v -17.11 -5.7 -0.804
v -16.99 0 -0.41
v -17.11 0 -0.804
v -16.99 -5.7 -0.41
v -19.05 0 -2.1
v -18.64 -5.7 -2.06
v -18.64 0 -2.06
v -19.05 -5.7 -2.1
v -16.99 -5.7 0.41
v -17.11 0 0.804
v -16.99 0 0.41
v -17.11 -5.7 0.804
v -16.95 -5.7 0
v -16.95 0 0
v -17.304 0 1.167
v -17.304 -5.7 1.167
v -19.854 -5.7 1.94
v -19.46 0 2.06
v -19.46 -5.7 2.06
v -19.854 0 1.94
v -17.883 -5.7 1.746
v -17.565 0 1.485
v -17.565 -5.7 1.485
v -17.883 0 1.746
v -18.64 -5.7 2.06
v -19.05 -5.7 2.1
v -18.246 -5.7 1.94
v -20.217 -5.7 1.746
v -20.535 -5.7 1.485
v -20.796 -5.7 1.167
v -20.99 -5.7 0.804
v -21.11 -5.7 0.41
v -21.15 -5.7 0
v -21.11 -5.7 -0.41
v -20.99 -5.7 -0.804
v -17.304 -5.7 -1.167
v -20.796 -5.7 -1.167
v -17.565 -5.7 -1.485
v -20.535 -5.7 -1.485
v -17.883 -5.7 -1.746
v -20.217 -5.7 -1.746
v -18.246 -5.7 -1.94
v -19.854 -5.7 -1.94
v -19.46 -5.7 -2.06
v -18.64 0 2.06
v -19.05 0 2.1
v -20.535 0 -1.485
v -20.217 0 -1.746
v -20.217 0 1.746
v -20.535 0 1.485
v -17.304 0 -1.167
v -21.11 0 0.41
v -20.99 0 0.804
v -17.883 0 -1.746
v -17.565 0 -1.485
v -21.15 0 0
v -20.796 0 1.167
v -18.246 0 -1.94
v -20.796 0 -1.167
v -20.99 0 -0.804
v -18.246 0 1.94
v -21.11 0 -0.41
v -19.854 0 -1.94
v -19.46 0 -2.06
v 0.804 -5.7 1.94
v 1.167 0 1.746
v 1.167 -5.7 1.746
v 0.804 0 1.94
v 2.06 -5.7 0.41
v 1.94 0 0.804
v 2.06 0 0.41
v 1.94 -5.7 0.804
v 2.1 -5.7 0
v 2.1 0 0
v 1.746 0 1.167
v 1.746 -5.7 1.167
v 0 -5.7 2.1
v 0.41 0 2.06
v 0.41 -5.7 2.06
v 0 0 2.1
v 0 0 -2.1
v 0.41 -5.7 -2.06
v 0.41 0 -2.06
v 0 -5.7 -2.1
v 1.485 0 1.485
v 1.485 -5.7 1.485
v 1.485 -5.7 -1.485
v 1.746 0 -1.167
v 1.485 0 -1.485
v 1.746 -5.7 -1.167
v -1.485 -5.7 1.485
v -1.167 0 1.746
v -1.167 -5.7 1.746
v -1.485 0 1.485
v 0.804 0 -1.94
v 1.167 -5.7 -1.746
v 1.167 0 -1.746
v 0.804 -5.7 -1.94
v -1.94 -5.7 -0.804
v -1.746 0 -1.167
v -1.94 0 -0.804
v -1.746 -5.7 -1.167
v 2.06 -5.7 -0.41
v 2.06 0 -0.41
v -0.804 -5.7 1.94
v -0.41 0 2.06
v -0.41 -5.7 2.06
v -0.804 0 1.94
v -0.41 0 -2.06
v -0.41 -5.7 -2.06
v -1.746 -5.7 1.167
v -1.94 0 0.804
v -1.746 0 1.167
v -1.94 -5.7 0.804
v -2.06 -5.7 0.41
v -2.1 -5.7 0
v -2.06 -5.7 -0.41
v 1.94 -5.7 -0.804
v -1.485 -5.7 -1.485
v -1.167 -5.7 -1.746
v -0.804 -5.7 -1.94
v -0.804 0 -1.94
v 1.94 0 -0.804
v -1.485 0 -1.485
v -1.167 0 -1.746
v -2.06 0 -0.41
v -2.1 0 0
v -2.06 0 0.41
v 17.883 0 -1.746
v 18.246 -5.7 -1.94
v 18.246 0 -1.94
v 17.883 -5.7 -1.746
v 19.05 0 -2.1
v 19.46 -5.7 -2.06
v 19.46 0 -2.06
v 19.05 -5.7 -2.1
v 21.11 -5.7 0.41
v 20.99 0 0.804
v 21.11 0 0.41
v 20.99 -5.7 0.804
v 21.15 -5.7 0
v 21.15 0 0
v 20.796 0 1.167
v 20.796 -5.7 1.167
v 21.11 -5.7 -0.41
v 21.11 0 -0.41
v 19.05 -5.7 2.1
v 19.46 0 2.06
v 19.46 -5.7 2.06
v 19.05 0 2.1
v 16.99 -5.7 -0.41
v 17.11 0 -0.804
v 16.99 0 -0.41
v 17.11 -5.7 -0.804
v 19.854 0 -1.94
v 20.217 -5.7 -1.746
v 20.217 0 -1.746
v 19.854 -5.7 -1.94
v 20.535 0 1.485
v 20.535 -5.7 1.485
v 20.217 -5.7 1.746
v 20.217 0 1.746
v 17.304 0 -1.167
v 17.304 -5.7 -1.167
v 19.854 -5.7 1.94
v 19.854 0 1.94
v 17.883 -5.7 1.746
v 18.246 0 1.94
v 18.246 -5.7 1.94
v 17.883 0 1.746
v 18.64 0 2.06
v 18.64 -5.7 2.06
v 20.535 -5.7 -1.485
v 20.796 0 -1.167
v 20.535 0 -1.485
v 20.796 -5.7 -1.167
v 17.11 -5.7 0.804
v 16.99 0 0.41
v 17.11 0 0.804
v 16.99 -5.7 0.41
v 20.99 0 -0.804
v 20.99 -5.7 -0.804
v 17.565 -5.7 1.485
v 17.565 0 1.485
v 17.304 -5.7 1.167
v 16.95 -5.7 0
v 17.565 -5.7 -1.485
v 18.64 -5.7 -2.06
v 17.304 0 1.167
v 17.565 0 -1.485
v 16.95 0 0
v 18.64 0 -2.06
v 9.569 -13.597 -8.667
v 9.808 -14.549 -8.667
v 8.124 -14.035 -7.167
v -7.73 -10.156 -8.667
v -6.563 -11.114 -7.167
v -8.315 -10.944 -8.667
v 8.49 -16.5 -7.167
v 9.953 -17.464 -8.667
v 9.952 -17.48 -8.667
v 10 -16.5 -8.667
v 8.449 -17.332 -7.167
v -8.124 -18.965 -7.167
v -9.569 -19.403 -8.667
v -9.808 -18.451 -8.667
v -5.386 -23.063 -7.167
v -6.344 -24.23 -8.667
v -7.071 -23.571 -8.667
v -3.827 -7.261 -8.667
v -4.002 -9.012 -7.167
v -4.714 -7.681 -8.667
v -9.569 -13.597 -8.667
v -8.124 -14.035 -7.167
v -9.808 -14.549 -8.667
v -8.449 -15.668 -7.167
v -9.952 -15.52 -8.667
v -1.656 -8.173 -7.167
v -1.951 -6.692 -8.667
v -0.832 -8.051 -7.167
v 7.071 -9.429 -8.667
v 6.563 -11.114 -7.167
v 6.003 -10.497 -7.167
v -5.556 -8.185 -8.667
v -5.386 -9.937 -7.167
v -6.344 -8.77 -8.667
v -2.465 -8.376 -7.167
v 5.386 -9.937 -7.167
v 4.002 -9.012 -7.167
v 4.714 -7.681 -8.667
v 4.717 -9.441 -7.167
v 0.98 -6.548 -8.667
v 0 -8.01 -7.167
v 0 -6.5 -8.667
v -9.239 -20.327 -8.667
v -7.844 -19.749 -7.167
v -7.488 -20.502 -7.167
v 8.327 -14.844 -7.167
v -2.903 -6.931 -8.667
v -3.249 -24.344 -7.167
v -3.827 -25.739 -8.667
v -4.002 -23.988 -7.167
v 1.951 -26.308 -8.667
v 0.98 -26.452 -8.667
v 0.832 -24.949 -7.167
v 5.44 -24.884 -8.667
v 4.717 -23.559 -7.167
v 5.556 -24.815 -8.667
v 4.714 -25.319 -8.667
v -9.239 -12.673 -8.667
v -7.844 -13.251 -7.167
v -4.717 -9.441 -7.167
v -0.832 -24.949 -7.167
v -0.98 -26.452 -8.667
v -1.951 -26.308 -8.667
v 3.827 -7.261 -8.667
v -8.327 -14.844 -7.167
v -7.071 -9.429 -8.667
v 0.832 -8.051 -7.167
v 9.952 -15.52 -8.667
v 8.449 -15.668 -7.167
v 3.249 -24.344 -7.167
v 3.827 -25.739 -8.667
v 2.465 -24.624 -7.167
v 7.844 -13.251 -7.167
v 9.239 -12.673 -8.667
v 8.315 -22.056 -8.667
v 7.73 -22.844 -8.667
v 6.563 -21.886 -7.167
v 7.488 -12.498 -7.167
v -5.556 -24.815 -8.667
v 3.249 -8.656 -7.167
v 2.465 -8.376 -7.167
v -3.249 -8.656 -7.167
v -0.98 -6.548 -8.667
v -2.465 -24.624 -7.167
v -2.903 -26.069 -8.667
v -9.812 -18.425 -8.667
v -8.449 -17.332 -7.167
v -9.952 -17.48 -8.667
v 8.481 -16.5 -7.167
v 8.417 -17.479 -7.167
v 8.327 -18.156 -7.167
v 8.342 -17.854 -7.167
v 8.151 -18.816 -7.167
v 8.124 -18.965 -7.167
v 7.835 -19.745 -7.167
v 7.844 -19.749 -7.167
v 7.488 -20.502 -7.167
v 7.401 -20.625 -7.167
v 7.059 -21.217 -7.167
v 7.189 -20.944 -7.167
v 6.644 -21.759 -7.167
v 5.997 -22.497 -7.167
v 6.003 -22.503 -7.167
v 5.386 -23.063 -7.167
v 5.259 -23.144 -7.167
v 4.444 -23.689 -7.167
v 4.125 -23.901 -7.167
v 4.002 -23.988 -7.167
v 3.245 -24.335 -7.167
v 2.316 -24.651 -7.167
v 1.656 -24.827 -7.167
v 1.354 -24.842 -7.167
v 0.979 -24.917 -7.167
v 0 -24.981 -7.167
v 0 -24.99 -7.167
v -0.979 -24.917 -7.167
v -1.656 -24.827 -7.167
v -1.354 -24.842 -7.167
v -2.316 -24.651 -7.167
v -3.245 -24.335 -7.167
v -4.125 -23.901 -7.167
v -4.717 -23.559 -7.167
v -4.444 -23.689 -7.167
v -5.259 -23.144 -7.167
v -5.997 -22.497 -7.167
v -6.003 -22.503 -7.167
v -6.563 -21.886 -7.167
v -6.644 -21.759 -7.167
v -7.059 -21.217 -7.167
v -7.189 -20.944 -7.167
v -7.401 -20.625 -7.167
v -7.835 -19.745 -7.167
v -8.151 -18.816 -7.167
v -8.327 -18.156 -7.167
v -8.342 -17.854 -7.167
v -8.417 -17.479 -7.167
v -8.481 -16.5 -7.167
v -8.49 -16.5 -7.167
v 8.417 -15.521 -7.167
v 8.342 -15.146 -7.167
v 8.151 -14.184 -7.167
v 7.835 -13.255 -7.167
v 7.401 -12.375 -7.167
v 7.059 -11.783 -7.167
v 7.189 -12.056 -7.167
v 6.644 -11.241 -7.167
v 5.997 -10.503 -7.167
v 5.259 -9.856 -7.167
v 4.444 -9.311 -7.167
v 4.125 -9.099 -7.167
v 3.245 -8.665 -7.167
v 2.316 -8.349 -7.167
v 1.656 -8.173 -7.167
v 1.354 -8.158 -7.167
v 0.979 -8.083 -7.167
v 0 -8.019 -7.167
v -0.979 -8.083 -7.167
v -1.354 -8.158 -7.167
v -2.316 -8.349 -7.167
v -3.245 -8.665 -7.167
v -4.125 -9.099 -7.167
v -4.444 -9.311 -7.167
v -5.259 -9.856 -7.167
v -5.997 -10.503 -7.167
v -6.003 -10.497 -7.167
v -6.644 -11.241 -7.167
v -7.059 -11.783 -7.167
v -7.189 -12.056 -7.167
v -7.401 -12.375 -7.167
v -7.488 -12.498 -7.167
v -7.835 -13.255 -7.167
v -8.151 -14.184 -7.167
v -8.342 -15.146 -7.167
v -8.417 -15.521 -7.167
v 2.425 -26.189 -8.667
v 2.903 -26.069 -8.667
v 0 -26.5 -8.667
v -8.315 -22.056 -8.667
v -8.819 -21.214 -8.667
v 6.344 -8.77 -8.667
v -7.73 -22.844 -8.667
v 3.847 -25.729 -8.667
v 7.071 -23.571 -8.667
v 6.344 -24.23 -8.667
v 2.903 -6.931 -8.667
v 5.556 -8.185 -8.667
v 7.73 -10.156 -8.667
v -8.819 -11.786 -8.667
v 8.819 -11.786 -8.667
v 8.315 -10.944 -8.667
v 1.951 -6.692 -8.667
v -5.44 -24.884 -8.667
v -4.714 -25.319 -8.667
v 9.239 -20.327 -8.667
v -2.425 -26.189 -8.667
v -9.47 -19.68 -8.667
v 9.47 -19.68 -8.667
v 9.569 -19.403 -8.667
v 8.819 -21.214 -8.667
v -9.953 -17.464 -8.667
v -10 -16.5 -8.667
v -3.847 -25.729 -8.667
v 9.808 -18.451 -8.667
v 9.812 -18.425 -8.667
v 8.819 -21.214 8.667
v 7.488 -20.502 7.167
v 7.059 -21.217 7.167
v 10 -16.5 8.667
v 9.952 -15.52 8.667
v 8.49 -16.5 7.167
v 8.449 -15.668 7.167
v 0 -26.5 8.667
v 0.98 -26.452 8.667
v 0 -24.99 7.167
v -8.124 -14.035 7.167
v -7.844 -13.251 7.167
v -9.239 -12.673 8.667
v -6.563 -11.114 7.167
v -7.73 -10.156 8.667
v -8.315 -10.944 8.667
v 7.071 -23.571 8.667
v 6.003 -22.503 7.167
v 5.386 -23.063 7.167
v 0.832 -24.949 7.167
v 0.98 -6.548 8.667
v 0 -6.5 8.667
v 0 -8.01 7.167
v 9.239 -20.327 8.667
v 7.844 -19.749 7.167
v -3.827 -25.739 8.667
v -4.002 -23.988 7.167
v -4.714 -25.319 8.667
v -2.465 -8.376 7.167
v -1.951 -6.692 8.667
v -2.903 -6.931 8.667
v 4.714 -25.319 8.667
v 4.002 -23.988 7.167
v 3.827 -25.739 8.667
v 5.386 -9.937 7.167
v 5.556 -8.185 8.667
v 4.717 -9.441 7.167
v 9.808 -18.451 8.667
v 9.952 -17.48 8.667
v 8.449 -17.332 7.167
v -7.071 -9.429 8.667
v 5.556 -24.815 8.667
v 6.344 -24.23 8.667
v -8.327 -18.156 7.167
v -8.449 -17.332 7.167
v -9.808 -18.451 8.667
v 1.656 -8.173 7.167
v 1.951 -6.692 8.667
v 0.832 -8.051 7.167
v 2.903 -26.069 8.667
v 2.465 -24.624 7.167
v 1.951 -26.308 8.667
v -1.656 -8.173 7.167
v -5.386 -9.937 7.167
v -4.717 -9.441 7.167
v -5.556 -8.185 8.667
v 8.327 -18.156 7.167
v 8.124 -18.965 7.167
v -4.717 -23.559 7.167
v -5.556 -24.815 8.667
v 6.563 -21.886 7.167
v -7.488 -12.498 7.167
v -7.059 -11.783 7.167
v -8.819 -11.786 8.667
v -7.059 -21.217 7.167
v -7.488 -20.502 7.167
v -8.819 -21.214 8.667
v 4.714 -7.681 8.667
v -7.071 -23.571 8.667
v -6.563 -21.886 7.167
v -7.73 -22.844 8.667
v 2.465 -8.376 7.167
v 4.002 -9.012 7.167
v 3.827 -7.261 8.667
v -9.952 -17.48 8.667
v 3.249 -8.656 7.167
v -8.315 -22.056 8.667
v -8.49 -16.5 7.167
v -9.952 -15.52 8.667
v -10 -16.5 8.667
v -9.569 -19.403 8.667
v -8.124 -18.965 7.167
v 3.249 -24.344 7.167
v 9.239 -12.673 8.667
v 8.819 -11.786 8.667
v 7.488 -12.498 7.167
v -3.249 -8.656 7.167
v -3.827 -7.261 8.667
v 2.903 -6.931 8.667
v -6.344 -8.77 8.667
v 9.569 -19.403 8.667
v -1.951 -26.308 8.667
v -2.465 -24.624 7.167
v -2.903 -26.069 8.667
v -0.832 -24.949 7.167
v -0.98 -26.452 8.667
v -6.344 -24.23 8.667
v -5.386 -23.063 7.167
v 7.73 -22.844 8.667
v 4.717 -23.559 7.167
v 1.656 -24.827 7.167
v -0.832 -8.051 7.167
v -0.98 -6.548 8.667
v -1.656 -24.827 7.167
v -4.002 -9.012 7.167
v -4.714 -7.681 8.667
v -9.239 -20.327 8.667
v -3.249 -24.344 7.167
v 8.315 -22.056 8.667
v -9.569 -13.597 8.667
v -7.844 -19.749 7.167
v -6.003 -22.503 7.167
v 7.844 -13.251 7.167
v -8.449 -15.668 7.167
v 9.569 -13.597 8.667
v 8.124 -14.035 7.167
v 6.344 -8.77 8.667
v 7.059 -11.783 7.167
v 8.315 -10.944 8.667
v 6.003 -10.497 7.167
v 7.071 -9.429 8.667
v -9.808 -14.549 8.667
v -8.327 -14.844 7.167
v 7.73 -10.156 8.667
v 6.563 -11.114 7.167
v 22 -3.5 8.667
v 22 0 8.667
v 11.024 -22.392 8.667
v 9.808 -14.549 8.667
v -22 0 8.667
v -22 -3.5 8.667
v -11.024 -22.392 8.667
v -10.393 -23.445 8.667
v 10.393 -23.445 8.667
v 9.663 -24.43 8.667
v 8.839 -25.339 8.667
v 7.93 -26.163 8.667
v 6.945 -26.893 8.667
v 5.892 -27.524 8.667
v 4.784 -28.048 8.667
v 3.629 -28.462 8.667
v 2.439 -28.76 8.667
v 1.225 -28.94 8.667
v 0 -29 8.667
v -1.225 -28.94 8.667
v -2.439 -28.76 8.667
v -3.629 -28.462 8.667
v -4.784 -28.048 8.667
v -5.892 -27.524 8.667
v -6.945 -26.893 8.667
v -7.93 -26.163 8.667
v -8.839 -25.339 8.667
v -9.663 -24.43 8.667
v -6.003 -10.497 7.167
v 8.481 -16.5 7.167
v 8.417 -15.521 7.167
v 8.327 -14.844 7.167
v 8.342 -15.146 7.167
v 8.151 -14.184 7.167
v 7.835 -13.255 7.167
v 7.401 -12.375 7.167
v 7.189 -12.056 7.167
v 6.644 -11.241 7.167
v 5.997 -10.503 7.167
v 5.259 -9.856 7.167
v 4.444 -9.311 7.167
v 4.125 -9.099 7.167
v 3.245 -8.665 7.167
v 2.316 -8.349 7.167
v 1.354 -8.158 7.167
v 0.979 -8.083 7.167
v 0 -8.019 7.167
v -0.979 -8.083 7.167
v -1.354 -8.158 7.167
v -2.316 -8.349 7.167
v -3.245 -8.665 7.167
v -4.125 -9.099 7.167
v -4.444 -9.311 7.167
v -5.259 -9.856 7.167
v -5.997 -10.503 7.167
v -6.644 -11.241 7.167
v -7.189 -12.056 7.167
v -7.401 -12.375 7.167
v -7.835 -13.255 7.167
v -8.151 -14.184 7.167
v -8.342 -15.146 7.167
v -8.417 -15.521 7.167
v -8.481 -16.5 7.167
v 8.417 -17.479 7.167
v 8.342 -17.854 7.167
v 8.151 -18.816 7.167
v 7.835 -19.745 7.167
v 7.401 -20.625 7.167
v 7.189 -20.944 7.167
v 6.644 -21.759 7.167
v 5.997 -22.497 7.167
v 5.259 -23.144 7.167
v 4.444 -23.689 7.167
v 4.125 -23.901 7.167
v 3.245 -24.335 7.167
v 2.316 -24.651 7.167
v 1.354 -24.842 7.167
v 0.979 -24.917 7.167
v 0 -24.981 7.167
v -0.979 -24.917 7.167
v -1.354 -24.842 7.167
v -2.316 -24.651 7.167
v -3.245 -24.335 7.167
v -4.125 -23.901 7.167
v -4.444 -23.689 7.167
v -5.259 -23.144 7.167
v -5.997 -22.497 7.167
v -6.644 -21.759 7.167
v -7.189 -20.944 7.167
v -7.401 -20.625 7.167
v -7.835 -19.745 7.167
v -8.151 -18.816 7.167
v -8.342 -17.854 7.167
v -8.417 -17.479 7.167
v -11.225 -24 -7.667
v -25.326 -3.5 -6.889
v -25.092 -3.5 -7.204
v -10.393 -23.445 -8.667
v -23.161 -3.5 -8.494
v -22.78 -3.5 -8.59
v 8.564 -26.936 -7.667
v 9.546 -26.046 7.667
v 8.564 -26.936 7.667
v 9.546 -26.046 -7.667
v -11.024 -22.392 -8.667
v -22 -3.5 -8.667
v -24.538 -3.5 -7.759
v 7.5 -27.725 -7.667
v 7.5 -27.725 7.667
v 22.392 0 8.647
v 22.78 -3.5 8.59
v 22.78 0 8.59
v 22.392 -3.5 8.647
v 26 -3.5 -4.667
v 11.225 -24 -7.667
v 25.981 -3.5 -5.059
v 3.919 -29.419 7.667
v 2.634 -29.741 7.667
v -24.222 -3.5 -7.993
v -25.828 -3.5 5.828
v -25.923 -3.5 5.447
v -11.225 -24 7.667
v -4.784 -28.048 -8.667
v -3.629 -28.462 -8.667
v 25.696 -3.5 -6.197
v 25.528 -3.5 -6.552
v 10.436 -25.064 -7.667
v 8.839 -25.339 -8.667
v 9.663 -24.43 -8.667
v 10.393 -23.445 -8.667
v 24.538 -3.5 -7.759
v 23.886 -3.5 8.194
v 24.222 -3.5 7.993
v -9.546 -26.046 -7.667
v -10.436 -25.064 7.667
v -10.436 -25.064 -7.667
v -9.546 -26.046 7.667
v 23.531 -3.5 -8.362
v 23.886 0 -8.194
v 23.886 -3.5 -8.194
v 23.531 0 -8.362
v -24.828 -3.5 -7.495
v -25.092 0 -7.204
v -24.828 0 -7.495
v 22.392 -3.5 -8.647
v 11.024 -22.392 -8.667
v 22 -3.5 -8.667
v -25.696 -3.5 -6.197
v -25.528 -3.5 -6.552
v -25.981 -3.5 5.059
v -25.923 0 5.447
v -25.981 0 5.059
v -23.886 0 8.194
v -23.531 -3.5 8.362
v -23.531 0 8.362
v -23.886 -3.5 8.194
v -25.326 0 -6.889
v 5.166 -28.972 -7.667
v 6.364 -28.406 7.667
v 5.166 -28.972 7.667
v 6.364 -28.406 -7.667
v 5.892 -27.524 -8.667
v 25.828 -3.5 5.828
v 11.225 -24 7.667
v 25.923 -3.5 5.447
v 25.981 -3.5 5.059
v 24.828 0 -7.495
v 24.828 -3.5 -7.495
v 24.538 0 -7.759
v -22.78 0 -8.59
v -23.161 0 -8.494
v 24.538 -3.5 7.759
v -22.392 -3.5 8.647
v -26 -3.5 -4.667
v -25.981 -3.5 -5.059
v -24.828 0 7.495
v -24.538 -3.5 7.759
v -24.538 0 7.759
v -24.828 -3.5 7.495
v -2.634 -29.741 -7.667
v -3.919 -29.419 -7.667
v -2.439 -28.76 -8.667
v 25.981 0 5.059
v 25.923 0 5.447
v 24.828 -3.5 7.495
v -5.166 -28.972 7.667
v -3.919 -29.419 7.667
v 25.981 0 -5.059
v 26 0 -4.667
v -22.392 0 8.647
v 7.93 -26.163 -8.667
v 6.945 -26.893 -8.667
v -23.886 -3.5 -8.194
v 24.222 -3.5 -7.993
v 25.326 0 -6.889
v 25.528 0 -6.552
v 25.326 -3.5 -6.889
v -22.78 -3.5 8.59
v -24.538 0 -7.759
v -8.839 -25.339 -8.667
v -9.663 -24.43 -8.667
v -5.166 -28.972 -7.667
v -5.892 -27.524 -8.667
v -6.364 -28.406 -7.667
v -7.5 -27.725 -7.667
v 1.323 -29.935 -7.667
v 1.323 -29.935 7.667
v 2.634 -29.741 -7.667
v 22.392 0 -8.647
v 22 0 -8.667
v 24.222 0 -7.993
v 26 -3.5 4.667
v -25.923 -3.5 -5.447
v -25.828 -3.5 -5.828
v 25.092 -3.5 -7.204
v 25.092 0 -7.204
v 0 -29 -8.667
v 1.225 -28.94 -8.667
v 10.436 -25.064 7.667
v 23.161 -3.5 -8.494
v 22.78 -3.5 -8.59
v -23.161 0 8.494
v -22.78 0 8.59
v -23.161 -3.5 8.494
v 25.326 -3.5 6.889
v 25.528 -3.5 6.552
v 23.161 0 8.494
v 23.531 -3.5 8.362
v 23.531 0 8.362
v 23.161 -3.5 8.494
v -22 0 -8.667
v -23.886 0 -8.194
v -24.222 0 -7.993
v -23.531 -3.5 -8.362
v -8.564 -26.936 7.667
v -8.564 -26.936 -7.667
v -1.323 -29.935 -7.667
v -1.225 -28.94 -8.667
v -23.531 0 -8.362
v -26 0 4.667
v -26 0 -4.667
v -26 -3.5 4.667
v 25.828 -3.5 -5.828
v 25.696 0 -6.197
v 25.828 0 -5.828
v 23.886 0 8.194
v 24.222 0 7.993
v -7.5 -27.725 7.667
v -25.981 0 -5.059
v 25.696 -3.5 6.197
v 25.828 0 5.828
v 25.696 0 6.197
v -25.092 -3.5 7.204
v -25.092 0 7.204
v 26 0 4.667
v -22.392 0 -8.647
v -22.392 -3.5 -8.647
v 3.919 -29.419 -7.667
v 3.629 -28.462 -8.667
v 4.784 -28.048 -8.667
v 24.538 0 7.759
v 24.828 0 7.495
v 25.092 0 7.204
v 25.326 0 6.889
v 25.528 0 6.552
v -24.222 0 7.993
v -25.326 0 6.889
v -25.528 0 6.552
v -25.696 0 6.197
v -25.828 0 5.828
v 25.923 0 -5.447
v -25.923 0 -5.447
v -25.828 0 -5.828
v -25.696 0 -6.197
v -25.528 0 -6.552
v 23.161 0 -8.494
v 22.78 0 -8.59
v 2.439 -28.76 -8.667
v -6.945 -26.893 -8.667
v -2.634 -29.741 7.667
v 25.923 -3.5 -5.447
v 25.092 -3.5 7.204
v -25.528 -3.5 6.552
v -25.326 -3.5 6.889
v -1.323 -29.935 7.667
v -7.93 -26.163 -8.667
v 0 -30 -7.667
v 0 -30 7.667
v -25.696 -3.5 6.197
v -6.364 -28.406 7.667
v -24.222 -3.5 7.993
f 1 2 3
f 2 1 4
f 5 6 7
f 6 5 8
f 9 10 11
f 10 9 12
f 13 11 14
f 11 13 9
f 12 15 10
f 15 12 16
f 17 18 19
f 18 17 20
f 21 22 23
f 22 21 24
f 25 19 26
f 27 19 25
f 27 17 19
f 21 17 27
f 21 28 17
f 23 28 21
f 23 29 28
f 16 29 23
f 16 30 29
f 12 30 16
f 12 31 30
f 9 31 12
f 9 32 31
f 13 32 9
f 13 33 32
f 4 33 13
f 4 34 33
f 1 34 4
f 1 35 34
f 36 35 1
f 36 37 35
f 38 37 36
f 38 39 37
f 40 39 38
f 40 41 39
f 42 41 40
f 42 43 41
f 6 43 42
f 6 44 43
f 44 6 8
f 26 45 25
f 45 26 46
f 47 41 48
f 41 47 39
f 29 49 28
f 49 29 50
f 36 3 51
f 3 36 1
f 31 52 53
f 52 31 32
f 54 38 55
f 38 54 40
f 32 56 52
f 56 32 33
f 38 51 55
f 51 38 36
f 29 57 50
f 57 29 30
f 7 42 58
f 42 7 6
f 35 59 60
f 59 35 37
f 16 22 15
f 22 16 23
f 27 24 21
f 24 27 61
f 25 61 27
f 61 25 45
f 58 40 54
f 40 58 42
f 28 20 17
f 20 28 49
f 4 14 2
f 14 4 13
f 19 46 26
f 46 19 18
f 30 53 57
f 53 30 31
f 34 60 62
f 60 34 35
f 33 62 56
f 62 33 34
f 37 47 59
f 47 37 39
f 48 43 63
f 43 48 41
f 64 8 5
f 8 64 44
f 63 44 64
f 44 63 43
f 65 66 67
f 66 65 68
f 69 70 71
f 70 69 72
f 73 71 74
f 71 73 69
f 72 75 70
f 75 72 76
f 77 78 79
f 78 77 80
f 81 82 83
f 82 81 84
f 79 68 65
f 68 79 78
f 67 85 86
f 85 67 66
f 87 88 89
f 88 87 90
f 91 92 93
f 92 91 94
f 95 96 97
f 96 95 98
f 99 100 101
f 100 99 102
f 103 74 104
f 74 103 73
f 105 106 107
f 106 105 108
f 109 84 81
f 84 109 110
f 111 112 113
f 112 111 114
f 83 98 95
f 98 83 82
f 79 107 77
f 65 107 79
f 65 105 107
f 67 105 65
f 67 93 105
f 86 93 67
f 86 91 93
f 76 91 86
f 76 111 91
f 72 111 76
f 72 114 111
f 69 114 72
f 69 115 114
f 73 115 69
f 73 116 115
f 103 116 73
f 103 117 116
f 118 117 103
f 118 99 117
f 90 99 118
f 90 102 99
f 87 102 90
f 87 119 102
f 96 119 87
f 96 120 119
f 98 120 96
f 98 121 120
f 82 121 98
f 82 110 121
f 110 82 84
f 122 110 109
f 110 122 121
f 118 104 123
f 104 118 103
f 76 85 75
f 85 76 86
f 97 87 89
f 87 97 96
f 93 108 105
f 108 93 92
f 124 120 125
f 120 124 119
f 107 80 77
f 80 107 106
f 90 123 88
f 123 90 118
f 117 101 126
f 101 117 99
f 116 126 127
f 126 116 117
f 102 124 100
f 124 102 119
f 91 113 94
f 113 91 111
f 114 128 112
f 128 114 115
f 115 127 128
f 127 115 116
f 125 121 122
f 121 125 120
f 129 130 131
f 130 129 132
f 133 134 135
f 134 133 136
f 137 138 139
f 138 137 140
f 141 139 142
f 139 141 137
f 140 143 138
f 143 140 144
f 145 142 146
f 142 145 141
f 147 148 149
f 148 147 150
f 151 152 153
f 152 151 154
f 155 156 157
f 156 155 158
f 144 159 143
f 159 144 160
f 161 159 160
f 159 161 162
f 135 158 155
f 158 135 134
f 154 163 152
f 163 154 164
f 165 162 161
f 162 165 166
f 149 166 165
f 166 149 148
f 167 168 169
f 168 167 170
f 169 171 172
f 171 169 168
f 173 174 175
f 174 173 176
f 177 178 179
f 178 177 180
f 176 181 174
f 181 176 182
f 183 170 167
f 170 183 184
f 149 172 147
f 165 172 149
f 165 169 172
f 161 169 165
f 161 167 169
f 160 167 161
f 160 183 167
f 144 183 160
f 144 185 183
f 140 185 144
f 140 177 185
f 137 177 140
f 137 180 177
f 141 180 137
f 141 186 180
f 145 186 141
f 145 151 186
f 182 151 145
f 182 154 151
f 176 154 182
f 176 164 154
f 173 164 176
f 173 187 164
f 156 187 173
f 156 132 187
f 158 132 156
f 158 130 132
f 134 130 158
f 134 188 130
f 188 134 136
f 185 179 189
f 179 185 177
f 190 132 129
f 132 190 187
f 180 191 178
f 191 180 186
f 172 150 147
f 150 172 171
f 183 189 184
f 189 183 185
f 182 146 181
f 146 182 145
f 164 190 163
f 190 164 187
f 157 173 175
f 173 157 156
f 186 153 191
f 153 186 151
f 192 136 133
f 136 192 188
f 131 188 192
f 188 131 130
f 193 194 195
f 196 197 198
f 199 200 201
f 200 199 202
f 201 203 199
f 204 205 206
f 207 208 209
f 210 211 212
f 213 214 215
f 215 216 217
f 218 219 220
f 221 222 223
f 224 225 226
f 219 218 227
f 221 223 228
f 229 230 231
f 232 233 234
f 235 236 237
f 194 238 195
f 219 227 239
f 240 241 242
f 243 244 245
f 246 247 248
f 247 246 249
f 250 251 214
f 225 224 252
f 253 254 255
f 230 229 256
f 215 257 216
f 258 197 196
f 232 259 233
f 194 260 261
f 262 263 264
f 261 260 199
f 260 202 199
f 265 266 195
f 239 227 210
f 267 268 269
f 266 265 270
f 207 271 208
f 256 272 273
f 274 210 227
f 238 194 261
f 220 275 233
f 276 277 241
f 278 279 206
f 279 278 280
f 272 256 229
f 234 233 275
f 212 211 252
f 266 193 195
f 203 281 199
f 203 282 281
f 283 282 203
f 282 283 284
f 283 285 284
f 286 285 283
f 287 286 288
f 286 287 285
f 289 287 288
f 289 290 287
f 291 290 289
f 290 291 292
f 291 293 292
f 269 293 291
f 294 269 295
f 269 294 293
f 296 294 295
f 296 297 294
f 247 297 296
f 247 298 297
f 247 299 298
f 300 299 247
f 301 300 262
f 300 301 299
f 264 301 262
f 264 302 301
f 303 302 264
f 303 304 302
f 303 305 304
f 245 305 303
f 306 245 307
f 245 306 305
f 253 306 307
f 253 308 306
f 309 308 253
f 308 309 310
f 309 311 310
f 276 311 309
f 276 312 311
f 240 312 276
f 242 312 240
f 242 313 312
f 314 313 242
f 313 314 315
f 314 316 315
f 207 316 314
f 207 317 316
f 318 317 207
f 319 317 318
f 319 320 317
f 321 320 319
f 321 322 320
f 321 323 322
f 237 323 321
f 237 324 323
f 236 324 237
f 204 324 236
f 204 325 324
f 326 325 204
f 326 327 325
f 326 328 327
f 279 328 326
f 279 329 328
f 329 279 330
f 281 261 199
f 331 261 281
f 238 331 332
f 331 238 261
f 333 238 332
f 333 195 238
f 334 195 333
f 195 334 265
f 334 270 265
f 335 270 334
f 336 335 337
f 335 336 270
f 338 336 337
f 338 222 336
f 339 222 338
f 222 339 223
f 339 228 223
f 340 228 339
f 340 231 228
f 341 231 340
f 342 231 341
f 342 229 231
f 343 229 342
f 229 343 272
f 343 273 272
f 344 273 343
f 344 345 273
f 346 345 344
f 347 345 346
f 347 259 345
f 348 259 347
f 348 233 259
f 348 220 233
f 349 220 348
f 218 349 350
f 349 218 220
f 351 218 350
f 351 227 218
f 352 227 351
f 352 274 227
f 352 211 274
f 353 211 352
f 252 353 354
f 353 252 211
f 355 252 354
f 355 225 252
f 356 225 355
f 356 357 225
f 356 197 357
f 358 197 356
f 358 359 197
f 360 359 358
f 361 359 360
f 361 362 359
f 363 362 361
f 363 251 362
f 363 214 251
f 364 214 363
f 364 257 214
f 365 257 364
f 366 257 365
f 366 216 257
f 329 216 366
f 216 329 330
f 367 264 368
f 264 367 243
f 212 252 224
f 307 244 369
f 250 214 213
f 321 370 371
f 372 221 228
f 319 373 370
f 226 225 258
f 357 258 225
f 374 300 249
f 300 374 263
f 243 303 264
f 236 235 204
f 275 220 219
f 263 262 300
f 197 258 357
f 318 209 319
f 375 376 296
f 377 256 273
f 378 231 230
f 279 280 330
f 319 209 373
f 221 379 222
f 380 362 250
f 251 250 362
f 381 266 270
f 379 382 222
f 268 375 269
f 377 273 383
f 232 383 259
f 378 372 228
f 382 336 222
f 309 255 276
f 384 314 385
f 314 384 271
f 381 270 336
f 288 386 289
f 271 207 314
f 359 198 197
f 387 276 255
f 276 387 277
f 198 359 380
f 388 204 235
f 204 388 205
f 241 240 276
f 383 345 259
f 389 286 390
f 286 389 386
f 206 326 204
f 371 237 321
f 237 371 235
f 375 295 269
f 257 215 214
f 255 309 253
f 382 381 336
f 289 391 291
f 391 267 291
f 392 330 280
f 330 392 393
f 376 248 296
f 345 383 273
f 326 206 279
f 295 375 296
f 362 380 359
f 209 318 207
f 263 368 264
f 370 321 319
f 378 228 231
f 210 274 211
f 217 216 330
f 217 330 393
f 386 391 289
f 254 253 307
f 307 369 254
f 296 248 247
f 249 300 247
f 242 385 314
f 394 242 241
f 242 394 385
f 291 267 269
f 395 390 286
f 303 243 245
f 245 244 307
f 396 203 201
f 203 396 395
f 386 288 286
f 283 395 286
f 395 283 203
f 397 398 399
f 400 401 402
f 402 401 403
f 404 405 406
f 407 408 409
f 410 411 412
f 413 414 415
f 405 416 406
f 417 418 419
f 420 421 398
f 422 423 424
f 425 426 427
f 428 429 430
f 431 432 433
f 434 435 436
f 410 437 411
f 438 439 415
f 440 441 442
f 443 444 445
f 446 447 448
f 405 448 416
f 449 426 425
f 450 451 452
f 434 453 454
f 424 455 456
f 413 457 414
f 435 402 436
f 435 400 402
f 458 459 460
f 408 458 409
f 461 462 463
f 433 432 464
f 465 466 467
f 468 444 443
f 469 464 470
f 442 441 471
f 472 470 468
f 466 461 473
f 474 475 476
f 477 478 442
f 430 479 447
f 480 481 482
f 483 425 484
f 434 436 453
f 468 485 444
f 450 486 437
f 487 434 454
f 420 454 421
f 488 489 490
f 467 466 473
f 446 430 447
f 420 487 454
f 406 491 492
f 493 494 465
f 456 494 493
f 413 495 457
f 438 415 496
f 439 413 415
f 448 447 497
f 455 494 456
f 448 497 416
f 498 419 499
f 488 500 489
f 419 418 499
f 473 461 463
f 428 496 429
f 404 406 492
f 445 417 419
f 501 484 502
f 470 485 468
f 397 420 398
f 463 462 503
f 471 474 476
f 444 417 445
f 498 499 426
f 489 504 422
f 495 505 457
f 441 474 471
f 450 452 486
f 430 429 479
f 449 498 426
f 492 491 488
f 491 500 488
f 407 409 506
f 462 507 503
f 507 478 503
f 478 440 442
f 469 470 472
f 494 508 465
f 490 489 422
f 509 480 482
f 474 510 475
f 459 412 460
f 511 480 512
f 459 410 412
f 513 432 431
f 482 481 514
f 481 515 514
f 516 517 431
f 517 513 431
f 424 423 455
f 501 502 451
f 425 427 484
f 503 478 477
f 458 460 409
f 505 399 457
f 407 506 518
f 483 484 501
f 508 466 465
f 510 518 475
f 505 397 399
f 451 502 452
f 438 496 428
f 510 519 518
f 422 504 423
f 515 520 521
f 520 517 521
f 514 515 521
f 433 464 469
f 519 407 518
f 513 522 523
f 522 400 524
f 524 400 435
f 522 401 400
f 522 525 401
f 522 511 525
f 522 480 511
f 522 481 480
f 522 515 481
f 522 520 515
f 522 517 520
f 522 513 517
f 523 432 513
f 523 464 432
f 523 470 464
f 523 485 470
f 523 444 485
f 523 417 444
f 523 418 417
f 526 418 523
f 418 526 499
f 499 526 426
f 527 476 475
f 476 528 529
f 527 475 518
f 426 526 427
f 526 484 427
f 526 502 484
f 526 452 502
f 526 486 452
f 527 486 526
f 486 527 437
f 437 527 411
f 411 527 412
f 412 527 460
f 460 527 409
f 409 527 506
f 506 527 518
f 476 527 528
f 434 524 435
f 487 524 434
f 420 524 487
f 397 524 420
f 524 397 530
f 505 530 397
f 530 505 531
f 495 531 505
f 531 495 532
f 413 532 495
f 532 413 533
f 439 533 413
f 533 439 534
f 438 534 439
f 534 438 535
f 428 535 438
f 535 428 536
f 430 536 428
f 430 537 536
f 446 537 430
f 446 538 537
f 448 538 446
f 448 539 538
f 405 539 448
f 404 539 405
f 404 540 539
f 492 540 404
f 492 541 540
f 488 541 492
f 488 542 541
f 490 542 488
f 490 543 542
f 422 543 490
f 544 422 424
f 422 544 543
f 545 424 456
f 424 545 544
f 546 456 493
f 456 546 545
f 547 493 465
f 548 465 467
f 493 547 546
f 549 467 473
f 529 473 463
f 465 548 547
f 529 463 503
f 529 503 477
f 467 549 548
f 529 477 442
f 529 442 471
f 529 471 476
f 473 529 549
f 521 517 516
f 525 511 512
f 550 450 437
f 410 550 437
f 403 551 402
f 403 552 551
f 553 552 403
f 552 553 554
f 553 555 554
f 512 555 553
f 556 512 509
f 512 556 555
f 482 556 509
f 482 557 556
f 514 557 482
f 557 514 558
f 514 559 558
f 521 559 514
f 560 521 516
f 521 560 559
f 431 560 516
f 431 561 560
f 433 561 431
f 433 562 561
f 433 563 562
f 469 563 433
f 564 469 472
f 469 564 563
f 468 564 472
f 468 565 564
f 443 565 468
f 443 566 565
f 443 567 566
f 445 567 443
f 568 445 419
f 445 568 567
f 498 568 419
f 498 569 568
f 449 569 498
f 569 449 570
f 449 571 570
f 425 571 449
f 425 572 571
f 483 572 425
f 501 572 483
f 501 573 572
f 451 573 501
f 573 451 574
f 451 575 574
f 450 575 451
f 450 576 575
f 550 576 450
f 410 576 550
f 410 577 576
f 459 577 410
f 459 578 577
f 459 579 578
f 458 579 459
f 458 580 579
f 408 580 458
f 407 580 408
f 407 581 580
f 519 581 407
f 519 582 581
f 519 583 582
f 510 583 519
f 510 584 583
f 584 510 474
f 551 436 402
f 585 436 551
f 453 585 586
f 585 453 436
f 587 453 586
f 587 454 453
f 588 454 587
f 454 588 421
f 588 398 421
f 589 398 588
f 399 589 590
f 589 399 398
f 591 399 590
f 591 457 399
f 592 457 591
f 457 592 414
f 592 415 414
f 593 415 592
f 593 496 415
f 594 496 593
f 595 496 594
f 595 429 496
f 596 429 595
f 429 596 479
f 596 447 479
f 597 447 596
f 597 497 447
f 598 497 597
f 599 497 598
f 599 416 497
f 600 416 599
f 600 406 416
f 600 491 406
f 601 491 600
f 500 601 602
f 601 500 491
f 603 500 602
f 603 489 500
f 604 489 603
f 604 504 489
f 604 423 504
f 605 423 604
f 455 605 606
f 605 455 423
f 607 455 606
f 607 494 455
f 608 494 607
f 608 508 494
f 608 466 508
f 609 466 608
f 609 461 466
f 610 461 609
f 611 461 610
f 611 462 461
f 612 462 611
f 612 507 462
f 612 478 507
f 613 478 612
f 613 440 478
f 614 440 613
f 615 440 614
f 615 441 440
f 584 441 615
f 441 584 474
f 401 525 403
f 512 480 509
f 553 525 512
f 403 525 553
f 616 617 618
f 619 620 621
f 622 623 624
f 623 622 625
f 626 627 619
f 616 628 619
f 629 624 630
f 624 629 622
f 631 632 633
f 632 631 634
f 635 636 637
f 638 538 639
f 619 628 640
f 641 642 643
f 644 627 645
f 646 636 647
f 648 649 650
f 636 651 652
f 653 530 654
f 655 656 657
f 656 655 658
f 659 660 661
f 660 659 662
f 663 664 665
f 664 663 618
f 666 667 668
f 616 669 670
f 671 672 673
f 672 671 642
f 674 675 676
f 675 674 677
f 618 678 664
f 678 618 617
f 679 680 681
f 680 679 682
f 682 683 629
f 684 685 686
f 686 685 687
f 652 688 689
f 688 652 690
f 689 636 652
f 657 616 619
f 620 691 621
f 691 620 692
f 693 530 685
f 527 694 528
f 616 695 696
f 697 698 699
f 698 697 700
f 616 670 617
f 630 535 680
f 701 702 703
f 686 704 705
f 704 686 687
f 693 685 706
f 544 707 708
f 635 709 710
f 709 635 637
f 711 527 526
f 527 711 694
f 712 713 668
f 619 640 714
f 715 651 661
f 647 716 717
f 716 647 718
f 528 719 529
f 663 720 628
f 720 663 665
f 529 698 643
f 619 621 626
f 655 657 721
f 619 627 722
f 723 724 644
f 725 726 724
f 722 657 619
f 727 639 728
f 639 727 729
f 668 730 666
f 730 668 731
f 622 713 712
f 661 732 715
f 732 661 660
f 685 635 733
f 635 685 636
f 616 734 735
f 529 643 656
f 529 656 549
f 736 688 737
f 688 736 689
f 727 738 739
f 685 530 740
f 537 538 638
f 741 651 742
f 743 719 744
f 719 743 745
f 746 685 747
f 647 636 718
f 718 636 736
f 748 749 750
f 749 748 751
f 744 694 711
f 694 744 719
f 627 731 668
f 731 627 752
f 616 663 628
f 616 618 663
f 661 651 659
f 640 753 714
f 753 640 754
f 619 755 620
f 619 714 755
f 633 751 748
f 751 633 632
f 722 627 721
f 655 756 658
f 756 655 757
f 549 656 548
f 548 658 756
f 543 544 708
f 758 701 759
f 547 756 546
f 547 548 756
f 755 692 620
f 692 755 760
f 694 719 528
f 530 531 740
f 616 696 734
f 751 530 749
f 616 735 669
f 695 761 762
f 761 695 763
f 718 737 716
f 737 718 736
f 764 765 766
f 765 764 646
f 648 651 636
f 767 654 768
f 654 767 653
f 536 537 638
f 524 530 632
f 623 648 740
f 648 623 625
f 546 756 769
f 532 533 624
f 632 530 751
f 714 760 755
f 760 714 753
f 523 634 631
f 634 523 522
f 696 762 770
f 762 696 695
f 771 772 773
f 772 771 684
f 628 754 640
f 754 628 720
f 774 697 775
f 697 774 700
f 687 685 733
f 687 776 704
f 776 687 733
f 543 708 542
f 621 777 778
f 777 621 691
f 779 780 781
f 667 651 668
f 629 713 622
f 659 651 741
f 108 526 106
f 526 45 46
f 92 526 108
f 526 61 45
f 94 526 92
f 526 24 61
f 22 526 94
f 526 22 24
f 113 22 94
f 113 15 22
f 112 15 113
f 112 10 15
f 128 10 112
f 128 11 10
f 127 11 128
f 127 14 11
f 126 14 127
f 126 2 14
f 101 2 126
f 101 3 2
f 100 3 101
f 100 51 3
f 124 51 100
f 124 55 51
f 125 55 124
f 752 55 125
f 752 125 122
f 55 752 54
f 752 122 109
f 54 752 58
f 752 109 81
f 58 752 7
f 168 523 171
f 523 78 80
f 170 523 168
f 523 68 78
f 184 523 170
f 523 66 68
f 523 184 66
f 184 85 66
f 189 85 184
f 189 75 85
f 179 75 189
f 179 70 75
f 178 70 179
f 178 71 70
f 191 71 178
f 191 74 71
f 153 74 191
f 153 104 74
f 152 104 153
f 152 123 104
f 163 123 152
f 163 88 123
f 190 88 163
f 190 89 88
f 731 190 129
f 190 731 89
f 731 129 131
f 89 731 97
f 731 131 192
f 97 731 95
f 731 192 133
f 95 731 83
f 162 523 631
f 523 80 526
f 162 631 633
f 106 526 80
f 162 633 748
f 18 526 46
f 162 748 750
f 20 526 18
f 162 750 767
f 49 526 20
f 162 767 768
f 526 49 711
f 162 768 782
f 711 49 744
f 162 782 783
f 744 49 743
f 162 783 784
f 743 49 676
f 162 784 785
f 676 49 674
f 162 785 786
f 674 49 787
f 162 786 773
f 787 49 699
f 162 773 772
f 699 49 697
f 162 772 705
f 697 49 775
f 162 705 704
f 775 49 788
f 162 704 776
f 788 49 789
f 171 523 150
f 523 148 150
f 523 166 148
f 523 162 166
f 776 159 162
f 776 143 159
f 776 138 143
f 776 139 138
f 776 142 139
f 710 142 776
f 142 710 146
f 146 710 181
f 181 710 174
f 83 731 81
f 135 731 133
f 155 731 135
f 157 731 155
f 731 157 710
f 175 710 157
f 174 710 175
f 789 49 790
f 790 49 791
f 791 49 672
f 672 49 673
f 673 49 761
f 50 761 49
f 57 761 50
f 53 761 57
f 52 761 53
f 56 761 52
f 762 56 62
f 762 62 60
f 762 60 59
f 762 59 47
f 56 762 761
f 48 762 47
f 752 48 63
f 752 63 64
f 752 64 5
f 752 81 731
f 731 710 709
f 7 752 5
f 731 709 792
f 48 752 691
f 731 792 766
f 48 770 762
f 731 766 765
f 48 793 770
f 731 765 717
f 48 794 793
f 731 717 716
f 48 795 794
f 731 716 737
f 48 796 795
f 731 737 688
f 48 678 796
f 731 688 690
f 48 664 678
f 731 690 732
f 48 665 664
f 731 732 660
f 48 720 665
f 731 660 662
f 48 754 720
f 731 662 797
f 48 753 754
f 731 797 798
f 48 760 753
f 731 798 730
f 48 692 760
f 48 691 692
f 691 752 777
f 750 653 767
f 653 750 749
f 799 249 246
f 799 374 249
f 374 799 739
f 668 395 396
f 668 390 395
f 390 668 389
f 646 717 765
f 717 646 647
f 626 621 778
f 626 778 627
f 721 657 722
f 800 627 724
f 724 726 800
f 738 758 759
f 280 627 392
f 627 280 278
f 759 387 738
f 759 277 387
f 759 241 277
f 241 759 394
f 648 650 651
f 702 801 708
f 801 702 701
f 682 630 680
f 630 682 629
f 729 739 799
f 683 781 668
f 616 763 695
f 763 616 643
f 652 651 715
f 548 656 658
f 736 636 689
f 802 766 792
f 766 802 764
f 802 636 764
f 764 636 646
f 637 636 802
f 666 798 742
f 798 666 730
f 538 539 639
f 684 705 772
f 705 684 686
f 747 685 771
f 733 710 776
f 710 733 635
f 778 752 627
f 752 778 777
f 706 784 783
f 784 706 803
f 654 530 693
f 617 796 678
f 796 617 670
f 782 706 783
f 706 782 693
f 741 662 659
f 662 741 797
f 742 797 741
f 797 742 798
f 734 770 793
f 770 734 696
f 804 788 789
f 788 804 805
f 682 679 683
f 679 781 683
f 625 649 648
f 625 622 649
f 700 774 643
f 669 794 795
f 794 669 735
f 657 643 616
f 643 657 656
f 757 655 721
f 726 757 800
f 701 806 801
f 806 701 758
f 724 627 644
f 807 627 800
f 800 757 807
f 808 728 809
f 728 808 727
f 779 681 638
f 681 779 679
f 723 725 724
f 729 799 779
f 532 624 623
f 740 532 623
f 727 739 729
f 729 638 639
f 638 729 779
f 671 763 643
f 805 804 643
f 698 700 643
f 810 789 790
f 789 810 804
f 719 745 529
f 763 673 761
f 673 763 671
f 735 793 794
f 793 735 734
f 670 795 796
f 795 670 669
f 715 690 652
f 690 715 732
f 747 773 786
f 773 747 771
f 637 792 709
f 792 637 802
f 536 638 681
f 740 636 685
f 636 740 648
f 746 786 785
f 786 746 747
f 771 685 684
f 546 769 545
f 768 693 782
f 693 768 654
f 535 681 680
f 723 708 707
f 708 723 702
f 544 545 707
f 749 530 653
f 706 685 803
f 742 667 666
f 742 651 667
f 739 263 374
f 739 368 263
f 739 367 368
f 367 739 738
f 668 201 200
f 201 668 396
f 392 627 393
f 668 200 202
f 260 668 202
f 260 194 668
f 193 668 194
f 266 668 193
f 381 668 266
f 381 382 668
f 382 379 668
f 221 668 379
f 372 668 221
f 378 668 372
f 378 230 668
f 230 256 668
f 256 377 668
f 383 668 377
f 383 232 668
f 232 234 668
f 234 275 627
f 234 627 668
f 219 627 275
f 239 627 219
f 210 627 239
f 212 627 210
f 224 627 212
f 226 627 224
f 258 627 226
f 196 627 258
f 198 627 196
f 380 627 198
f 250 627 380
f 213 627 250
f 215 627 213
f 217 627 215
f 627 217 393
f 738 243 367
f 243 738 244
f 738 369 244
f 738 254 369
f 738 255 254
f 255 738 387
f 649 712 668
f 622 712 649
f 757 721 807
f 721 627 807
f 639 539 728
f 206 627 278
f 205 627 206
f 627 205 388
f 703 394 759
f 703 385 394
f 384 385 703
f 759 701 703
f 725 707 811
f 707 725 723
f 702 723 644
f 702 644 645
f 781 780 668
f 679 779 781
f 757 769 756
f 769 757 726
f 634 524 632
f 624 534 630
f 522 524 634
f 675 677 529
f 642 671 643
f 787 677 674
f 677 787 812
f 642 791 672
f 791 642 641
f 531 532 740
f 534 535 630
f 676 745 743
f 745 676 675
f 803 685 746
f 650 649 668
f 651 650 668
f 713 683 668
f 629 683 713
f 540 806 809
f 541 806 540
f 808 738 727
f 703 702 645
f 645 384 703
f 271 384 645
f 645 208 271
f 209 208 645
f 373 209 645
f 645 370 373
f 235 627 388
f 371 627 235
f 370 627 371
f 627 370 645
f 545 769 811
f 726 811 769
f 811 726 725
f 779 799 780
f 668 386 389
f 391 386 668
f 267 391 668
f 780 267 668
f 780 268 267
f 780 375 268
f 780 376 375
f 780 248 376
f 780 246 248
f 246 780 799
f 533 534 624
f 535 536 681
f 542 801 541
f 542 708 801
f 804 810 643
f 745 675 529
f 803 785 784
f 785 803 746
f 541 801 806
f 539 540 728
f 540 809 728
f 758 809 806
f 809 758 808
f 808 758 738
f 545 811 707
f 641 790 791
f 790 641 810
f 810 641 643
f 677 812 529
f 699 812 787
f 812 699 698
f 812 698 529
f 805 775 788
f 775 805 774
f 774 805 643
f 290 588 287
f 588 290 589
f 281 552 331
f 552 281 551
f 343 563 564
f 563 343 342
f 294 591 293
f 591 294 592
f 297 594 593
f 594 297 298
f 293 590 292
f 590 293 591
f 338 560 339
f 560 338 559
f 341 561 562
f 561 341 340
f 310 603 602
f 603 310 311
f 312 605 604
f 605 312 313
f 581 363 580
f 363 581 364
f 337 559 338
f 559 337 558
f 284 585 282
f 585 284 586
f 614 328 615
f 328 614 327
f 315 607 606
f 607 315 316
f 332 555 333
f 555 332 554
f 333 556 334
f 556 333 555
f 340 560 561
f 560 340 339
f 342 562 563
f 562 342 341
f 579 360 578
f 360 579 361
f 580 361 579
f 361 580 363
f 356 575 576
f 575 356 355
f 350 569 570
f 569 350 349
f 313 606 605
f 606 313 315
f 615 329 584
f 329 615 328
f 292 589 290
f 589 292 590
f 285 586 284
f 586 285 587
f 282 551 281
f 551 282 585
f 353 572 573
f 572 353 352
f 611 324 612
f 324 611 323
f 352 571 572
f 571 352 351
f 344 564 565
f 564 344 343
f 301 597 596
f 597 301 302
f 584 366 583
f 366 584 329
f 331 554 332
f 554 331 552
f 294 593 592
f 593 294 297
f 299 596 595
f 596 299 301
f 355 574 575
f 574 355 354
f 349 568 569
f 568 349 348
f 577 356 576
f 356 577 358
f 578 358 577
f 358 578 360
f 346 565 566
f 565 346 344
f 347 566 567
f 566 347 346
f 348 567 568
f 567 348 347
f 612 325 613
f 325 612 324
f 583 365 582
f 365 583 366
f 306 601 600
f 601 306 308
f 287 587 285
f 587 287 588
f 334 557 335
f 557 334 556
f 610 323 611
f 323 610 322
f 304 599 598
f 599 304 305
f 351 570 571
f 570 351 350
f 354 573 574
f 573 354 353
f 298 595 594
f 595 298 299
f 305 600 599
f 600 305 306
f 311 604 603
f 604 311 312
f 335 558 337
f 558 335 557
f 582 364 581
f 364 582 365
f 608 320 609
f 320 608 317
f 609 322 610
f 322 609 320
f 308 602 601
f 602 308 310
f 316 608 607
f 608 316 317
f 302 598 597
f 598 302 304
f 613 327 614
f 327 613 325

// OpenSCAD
// file: lib/mounting-plate.scad
// Copyright (c) 2026 mmmaxwwwell
// Licensed under CC BY-NC-ND 4.0, https://creativecommons.org/licenses/by-nc-nd/4.0/
// Free for personal use. Commercial use requires a separate license.
//
// Kanix Mounting Plate
//
// The flat back plate that accessories use to bolt onto a Kanix belt clip.
// Geometry: rounded square with a rounded top edge, drilled from the bottom
// face with a blind bolt-shaft clearance grid that does NOT break through
// the top face. No counterbore — just the shaft.
//
// Bottom face (Z=0) is the clip-side: bolts come up from the clip into the
// plate. Top face stays unbroken — better cosmetics and prints flat without
// bridging over hole tops.
//
// Usage:
//   use <lib/mounting-plate.scad>
//   include <lib/presets.scad>
//   mounting_plate(kanix_preset_52x65);

include <common.scad>
include <presets.scad>

// Render a back plate sized + drilled for the given preset.
//
// preset            — a kanix_preset_* bundle from lib/presets.scad
// thickness         — override preset's plate_thickness
// corner_r          — XY corner radius (default: common.scad's plate_corner_r)
// edge_r            — top-edge fillet radius (default: common.scad's plate_edge_r)
// screw_hole_depth  — blind drill depth measured from the bottom face up.
//                     Defaults to the preset's screw_length so the hole is
//                     exactly long enough for the screw it's specified for.
// drill_holes       — set false to omit the bolt grid
// cutout            — when true, output ONLY the bolt-hole cylinders (no
//                     body). Use this inside a parent difference() when the
//                     plate body has been replaced or reshaped (e.g. after
//                     a hull) and you still want the original bolt pattern
//                     punched through. The cylinders extend from below the
//                     bottom face up through the entire plate thickness.
module mounting_plate(
    preset,
    thickness         = undef,
    corner_r          = undef,
    edge_r            = undef,
    screw_hole_depth  = undef,
    drill_holes       = true,
    hole_cols         = undef,
    hole_rows         = undef,
    cutout            = false
) {
    plate_size = preset_get(preset, "plate_size");
    t          = thickness == undef ? preset_get(preset, "plate_thickness") : thickness;
    cr         = corner_r == undef ? plate_corner_r : corner_r;
    er         = edge_r   == undef ? plate_edge_r   : edge_r;
    // Default hole depth = preset's screw_length (single source of truth).
    hole_dep   = screw_hole_depth == undef
                 ? preset_get(preset, "screw_length")
                 : screw_hole_depth;

    // Plate footprint: a fraction of the preset's full square plate, sized
    // by row/col count vs. the preset's full grid. A 1-row clip on a 3-row
    // preset is plate_size tall on its long edge and plate_size * 1/3 on
    // its short edge — i.e. the "middle slice" of the full plate.
    cols      = hole_cols == undef ? preset_get(preset, "hole_cols") : hole_cols;
    rows      = hole_rows == undef ? preset_get(preset, "hole_rows") : hole_rows;
    full_cols = preset_get(preset, "hole_cols");
    full_rows = preset_get(preset, "hole_rows");
    w         = plate_size * cols / full_cols;
    h         = plate_size * rows / full_rows;

    // Sanity: there must be material above the hole top.
    assert(hole_dep < t,
        "screw_hole_depth must be < plate thickness (holes are blind)");

    if (cutout) {
        // Cutout mode: only the bolt-hole cylinders, sized to punch
        // through the entire plate thickness from below. Caller is
        // responsible for placing this inside a difference().
        plate_holes(preset, t + 0.2, cols, rows);
    } else {
        difference() {
            plate_body(w, h, t, cr, er);
            if (drill_holes) plate_holes(preset, hole_dep, cols, rows);
        }
    }
}

// Plate body: rounded square with a rounded top edge. Bottom face is flat
// (sits on the build plate); top face is filleted by edge_r.
module plate_body(w, h, t, cr, er) {
    hull() {
        for (x = [-w/2 + cr, w/2 - cr])
            for (y = [-h/2 + cr, h/2 - cr])
                translate([x, y, 0])
                    cylinder(r = cr, h = t - er);
        for (x = [-w/2 + cr, w/2 - cr])
            for (y = [-h/2 + cr, h/2 - cr])
                translate([x, y, t - er]) {
                    cylinder(r = cr - er, h = er);
                    sphere(r = er);
                }
    }
}

// Bolt grid: blind shaft-clearance hole drilled from the bottom face up to
// `hole_dep`. No counterbore — just the shaft. Pattern centered on origin.
module plate_holes(preset, hole_dep, cols, rows) {
    spacing    = preset_get(preset, "hole_spacing");
    pilot_d    = preset_get(preset, "pilot_hole_d");
    col_offset = (cols - 1) / 2;
    row_offset = (rows - 1) / 2;

    for (col = [0 : cols - 1])
        for (row = [0 : rows - 1])
            translate([
                (col - col_offset) * spacing,
                (row - row_offset) * spacing,
                -0.1   // poke through bottom for a clean boolean
            ])
                cylinder(d = pilot_d, h = hole_dep + 0.1, $fn = 32);
}
// file: lib/common.scad
// Copyright (c) 2026 mmmaxwwwell
// Licensed under CC BY-NC-ND 4.0, https://creativecommons.org/licenses/by-nc-nd/4.0/
// Free for personal use. Commercial use requires a separate license.
//
// Kanix Common Parameters
// Shared constants Kanix belt clip mounting.
// 3x3 grid of holes, 3/4" (19.05mm) spacing, M5 self-tapping screws.

// ===== Kanix Mounting Constants =====
kanix_hole_spacing = 19.05; // mm between adjacent holes (3/4")
kanix_screw_d      = 4.2;   // mm pilot hole for M5 self-tap

// ===== Default Plate Parameters =====
// Override these after include if your design needs different values.
plate_margin   = 7;   // mm margin around outermost holes
plate_corner_r = 4;   // mm corner radius
plate_edge_r   = 2;   // mm top edge rounding radius

// ===== Helper Functions =====

// Plate dimension for a given grid size and margin.
// Returns the width or height of a square plate that fits the hole grid.
function kanix_plate_dim(grid_size, margin = plate_margin) =
    kanix_hole_spacing * (grid_size - 1) + margin * 2;

// Grid offset: centers a grid_size x grid_size pattern around the origin.
function kanix_grid_offset(grid_size) =
    (grid_size - 1) / 2;
// file: lib/carabiner-clip.scad
// Copyright (c) 2026 mmmaxwwwell
// Licensed under CC BY-NC-ND 4.0, https://creativecommons.org/licenses/by-nc-nd/4.0/
// Free for personal use. Commercial use requires a separate license.
//
// Kanix Carabiner Clip
//
// A mounting plate (1x3 or 2x3) with a disc-shaped carabiner attachment
// hulled onto its long edge. The disc is bored through the middle to leave
// a ring; the hull from the disc back to the plate forms a triangular
// gusset, giving the classic "ring on a tab" shape for clipping a
// carabiner. The plate's bottom face sits flat on the print bed.

include <common.scad>
include <presets.scad>
use <mounting-plate.scad>

module carabiner_clip(
    preset,
    hole_rows            = 1,    // 1 = single-row clip, 2 = double-row clip
    hole_cols            = 3,    // columns along the plate's long edge
    outer_disc_diameter  = 22,   // outside diameter of the carabiner disc
    outer_disc_height    = 12,   // disc thickness (axis = Y, away from plate)
    inner_disc_diameter  = 12,   // through-hole the carabiner clips into
    disc_taper           = 5,    // 45° taper depth on each face of the disc
    bore_chamfer         = 1.5,  // 45° chamfer radial depth on each lip of the bore
    bore_chamfer_recess  = 0,    // shift chamfer narrow end inward along bore axis (recess below disc face)
    bore_round           = 1,    // round-over on every edge of the bore cut
    screw_length         = undef // override preset's screw_length for this accessory
) {
    assert(outer_disc_height > 2 * disc_taper,
        "outer_disc_height must exceed 2 * disc_taper for a flat middle band");

    plate_t = preset_get(preset, "plate_thickness");
    screw_l = screw_length == undef ? preset_get(preset, "screw_length") : screw_length;

    // Disc center sits so the bore's bottom edge clears the screw tip by
    // 1 mm. Screw tip is at Z = screw_length (screws driven up from Z=0
    // through the plate bottom). Bore bottom in world Z is
    // disc_z - inner_disc_diameter/2, so:
    //   disc_z = screw_length + 1 + inner_disc_diameter/2
    // Clamp to plate_t + bore_radius so the bore never dips into the plate
    // top when the screw is short.
    disc_y = 0;
    disc_z = max(plate_t + inner_disc_diameter / 2,
                 screw_l + 1 + inner_disc_diameter / 2);

    difference() {
        // Hull the outer disc to the entire mounting plate.
        hull() {
            mounting_plate(preset,
                           hole_rows  = hole_rows,
                           hole_cols  = hole_cols,
                           drill_holes = false);
            translate([0, disc_y, disc_z])
                rotate([90, 0, 0])
                    tapered_disc(d = outer_disc_diameter,
                                 h = outer_disc_height,
                                 taper = disc_taper);
        }
        // Re-cut the bolt grid using the plate module's own cutout mode,
        // so spacing/offsets/diameter stay in lockstep with the plate.
        // Hole cylinders go through the full plate thickness.
        mounting_plate(preset,
                       hole_rows = hole_rows,
                       hole_cols = hole_cols,
                       cutout    = true);
        // Carabiner through-hole. Cut all the way through the gusset along
        // Y (not just the disc thickness) so the bore actually opens to
        // the air on both faces of the pyramid. Minkowski with a sphere
        // rounds every edge of this cut (including the sharp corner where
        // the bore exits the plate's top face). The cylinder is shrunk by
        // bore_round first so the final hole size still matches
        // inner_disc_diameter after the sphere inflates it back.
        plate_sz = preset_get(preset, "plate_size");
        bore_len = plate_sz * 2;   // generous overshoot, trimmed by the hull
        translate([0, 0, disc_z])
            rotate([90, 0, 0])
                minkowski() {
                    cylinder(d = inner_disc_diameter - 2 * bore_round,
                             h = bore_len - 2 * bore_round,
                             center = true,
                             $fn = 48);
                    sphere(r = bore_round, $fn = 16);
                }
        // 45° chamfer cone at each mouth of the bore. Coaxial with the
        // bore (axis along Y). Axial length = radial depth = bore_chamfer
        // (true 45°). `bore_chamfer_recess` slides the whole chamfer cone
        // INWARD along the bore so its wide end sits that far below the
        // disc face — useful for keeping a flat disc face while still
        // breaking the inner edge of the bore.
        bore_r = inner_disc_diameter / 2;
        if (bore_chamfer > 0)
            for (side = [-1, 1])
                // Wide end (r2) lands at y = side * (disc_h/2 - recess).
                // Cylinder is built from narrow end at z=0 to wide end at
                // z=h; rotate maps +Z -> +/-Y depending on side. Place the
                // cylinder origin so the wide end ends up at the recessed
                // disc face position.
                translate([0,
                           side * (outer_disc_height / 2 - bore_chamfer_recess - bore_chamfer),
                           disc_z])
                    rotate([side > 0 ? -90 : 90, 0, 0])
                        cylinder(h  = bore_chamfer,
                                 r1 = bore_r - 0.01,
                                 r2 = bore_r + bore_chamfer,
                                 $fn = 64);
    }
}

// Disc of diameter d and height h along Z, with a 45° taper of depth
// `taper` cut from each circular face. Outer diameter narrows from d in
// the middle to (d - 2*taper) at each end face. Centered on origin.
module tapered_disc(d, h, taper) {
    r = d / 2;
    translate([0, 0, -h/2])
        rotate_extrude($fn = 64)
            polygon(points = [
                [0,         0],
                [r - taper, 0],
                [r,         taper],
                [r,         h - taper],
                [r - taper, h],
                [0,         h]
            ]);
}
// file: lib/presets.scad
// Copyright (c) 2026 mmmaxwwwell
// Licensed under CC BY-NC-ND 4.0, https://creativecommons.org/licenses/by-nc-nd/4.0/
// Free for personal use. Commercial use requires a separate license.
//
// Kanix Belt Presets
//
// A preset is a vector-of-pairs ("struct") describing the mounting interface
// for a Kanix belt clip. Accessories take a preset and pull every
// belt-and-bolt-pattern dimension from it, so the holster's bolt grid is
// guaranteed to align with the clip it mounts to.
//
// To add a preset: copy a block, change the values, give it a unique name.

include <common.scad>

// ----- 37mm plate, 4mm belt (2x2 hole grid) -----
kanix_preset_37x4 = [
    ["name",          "37x4"],
    ["plate_size",    37],     // mm, square plate edge length
    ["plate_thickness", 4],    // mm
    ["belt_thickness", 4],     // mm (clip-only; accessories ignore)
    ["belt_height",   51],     // mm (2" duty belt; clip-only)
    ["hole_cols",     2],
    ["hole_rows",     2],
    ["hole_spacing",  kanix_hole_spacing],
    ["pilot_hole_d",  kanix_screw_d],   // M5 self-tap pilot — threads bite into plastic
    ["screw_length",  3]                // plate_thickness - 1mm: max screw bite without poking through
];

// ----- 52mm plate, 6.5mm belt (3x3 hole grid) -----
kanix_preset_52x65 = [
    ["name",          "52x6_5"],
    ["plate_size",    52],
    ["plate_thickness", 5.5],
    ["belt_thickness", 6.5],
    ["belt_height",   51],
    ["hole_cols",     3],
    ["hole_rows",     3],
    ["hole_spacing",  kanix_hole_spacing],
    ["pilot_hole_d",  kanix_screw_d],
    ["screw_length",  5]                // 5mm screw bite, 0.5mm cap above
];

// ----- Accessor -----
// Look up a field by key. Errors loudly (undef) if the key is absent so a
// typo surfaces immediately instead of silently using a default.
function preset_get(preset, key) =
    let (hits = [for (kv = preset) if (kv[0] == key) kv[1]])
    hits[0];
// main file
// Copyright (c) 2026 mmmaxwwwell
// Licensed under CC BY-NC-ND 4.0, https://creativecommons.org/licenses/by-nc-nd/4.0/
// Free for personal use. Commercial use requires a separate license.
//
// Render fixture: 1x3 carabiner clip on the 52x6.5 preset.

include <lib/presets.scad>
use <lib/carabiner-clip.scad>

$fn = 64;

rotate([90,0,0])
carabiner_clip(kanix_preset_52x65,
    hole_rows           = 1,    // 1 = single-row clip, 2 = double-row clip
    hole_cols           = 3,    // columns along the plate's long edge
    outer_disc_diameter = 27,   // outside diameter of the carabiner disc
    outer_disc_height   = 52/3,   // disc thickness (axis = Y, away from plate)
    inner_disc_diameter = 17,   // through-hole the carabiner clips into
    disc_taper          = 1,    // 45° taper depth on each face of the disc
    bore_chamfer        = 1.5,    // 45° chamfer radial depth on each lip of the bore
    bore_chamfer_recess = 0,    // shift chamfer narrow end inward along bore axis (recess below disc face)
    bore_round          = 1,    // round-over on every edge of the bore cut
    screw_length        = 7     // override preset's screw_length (5mm) for this fixture
);
